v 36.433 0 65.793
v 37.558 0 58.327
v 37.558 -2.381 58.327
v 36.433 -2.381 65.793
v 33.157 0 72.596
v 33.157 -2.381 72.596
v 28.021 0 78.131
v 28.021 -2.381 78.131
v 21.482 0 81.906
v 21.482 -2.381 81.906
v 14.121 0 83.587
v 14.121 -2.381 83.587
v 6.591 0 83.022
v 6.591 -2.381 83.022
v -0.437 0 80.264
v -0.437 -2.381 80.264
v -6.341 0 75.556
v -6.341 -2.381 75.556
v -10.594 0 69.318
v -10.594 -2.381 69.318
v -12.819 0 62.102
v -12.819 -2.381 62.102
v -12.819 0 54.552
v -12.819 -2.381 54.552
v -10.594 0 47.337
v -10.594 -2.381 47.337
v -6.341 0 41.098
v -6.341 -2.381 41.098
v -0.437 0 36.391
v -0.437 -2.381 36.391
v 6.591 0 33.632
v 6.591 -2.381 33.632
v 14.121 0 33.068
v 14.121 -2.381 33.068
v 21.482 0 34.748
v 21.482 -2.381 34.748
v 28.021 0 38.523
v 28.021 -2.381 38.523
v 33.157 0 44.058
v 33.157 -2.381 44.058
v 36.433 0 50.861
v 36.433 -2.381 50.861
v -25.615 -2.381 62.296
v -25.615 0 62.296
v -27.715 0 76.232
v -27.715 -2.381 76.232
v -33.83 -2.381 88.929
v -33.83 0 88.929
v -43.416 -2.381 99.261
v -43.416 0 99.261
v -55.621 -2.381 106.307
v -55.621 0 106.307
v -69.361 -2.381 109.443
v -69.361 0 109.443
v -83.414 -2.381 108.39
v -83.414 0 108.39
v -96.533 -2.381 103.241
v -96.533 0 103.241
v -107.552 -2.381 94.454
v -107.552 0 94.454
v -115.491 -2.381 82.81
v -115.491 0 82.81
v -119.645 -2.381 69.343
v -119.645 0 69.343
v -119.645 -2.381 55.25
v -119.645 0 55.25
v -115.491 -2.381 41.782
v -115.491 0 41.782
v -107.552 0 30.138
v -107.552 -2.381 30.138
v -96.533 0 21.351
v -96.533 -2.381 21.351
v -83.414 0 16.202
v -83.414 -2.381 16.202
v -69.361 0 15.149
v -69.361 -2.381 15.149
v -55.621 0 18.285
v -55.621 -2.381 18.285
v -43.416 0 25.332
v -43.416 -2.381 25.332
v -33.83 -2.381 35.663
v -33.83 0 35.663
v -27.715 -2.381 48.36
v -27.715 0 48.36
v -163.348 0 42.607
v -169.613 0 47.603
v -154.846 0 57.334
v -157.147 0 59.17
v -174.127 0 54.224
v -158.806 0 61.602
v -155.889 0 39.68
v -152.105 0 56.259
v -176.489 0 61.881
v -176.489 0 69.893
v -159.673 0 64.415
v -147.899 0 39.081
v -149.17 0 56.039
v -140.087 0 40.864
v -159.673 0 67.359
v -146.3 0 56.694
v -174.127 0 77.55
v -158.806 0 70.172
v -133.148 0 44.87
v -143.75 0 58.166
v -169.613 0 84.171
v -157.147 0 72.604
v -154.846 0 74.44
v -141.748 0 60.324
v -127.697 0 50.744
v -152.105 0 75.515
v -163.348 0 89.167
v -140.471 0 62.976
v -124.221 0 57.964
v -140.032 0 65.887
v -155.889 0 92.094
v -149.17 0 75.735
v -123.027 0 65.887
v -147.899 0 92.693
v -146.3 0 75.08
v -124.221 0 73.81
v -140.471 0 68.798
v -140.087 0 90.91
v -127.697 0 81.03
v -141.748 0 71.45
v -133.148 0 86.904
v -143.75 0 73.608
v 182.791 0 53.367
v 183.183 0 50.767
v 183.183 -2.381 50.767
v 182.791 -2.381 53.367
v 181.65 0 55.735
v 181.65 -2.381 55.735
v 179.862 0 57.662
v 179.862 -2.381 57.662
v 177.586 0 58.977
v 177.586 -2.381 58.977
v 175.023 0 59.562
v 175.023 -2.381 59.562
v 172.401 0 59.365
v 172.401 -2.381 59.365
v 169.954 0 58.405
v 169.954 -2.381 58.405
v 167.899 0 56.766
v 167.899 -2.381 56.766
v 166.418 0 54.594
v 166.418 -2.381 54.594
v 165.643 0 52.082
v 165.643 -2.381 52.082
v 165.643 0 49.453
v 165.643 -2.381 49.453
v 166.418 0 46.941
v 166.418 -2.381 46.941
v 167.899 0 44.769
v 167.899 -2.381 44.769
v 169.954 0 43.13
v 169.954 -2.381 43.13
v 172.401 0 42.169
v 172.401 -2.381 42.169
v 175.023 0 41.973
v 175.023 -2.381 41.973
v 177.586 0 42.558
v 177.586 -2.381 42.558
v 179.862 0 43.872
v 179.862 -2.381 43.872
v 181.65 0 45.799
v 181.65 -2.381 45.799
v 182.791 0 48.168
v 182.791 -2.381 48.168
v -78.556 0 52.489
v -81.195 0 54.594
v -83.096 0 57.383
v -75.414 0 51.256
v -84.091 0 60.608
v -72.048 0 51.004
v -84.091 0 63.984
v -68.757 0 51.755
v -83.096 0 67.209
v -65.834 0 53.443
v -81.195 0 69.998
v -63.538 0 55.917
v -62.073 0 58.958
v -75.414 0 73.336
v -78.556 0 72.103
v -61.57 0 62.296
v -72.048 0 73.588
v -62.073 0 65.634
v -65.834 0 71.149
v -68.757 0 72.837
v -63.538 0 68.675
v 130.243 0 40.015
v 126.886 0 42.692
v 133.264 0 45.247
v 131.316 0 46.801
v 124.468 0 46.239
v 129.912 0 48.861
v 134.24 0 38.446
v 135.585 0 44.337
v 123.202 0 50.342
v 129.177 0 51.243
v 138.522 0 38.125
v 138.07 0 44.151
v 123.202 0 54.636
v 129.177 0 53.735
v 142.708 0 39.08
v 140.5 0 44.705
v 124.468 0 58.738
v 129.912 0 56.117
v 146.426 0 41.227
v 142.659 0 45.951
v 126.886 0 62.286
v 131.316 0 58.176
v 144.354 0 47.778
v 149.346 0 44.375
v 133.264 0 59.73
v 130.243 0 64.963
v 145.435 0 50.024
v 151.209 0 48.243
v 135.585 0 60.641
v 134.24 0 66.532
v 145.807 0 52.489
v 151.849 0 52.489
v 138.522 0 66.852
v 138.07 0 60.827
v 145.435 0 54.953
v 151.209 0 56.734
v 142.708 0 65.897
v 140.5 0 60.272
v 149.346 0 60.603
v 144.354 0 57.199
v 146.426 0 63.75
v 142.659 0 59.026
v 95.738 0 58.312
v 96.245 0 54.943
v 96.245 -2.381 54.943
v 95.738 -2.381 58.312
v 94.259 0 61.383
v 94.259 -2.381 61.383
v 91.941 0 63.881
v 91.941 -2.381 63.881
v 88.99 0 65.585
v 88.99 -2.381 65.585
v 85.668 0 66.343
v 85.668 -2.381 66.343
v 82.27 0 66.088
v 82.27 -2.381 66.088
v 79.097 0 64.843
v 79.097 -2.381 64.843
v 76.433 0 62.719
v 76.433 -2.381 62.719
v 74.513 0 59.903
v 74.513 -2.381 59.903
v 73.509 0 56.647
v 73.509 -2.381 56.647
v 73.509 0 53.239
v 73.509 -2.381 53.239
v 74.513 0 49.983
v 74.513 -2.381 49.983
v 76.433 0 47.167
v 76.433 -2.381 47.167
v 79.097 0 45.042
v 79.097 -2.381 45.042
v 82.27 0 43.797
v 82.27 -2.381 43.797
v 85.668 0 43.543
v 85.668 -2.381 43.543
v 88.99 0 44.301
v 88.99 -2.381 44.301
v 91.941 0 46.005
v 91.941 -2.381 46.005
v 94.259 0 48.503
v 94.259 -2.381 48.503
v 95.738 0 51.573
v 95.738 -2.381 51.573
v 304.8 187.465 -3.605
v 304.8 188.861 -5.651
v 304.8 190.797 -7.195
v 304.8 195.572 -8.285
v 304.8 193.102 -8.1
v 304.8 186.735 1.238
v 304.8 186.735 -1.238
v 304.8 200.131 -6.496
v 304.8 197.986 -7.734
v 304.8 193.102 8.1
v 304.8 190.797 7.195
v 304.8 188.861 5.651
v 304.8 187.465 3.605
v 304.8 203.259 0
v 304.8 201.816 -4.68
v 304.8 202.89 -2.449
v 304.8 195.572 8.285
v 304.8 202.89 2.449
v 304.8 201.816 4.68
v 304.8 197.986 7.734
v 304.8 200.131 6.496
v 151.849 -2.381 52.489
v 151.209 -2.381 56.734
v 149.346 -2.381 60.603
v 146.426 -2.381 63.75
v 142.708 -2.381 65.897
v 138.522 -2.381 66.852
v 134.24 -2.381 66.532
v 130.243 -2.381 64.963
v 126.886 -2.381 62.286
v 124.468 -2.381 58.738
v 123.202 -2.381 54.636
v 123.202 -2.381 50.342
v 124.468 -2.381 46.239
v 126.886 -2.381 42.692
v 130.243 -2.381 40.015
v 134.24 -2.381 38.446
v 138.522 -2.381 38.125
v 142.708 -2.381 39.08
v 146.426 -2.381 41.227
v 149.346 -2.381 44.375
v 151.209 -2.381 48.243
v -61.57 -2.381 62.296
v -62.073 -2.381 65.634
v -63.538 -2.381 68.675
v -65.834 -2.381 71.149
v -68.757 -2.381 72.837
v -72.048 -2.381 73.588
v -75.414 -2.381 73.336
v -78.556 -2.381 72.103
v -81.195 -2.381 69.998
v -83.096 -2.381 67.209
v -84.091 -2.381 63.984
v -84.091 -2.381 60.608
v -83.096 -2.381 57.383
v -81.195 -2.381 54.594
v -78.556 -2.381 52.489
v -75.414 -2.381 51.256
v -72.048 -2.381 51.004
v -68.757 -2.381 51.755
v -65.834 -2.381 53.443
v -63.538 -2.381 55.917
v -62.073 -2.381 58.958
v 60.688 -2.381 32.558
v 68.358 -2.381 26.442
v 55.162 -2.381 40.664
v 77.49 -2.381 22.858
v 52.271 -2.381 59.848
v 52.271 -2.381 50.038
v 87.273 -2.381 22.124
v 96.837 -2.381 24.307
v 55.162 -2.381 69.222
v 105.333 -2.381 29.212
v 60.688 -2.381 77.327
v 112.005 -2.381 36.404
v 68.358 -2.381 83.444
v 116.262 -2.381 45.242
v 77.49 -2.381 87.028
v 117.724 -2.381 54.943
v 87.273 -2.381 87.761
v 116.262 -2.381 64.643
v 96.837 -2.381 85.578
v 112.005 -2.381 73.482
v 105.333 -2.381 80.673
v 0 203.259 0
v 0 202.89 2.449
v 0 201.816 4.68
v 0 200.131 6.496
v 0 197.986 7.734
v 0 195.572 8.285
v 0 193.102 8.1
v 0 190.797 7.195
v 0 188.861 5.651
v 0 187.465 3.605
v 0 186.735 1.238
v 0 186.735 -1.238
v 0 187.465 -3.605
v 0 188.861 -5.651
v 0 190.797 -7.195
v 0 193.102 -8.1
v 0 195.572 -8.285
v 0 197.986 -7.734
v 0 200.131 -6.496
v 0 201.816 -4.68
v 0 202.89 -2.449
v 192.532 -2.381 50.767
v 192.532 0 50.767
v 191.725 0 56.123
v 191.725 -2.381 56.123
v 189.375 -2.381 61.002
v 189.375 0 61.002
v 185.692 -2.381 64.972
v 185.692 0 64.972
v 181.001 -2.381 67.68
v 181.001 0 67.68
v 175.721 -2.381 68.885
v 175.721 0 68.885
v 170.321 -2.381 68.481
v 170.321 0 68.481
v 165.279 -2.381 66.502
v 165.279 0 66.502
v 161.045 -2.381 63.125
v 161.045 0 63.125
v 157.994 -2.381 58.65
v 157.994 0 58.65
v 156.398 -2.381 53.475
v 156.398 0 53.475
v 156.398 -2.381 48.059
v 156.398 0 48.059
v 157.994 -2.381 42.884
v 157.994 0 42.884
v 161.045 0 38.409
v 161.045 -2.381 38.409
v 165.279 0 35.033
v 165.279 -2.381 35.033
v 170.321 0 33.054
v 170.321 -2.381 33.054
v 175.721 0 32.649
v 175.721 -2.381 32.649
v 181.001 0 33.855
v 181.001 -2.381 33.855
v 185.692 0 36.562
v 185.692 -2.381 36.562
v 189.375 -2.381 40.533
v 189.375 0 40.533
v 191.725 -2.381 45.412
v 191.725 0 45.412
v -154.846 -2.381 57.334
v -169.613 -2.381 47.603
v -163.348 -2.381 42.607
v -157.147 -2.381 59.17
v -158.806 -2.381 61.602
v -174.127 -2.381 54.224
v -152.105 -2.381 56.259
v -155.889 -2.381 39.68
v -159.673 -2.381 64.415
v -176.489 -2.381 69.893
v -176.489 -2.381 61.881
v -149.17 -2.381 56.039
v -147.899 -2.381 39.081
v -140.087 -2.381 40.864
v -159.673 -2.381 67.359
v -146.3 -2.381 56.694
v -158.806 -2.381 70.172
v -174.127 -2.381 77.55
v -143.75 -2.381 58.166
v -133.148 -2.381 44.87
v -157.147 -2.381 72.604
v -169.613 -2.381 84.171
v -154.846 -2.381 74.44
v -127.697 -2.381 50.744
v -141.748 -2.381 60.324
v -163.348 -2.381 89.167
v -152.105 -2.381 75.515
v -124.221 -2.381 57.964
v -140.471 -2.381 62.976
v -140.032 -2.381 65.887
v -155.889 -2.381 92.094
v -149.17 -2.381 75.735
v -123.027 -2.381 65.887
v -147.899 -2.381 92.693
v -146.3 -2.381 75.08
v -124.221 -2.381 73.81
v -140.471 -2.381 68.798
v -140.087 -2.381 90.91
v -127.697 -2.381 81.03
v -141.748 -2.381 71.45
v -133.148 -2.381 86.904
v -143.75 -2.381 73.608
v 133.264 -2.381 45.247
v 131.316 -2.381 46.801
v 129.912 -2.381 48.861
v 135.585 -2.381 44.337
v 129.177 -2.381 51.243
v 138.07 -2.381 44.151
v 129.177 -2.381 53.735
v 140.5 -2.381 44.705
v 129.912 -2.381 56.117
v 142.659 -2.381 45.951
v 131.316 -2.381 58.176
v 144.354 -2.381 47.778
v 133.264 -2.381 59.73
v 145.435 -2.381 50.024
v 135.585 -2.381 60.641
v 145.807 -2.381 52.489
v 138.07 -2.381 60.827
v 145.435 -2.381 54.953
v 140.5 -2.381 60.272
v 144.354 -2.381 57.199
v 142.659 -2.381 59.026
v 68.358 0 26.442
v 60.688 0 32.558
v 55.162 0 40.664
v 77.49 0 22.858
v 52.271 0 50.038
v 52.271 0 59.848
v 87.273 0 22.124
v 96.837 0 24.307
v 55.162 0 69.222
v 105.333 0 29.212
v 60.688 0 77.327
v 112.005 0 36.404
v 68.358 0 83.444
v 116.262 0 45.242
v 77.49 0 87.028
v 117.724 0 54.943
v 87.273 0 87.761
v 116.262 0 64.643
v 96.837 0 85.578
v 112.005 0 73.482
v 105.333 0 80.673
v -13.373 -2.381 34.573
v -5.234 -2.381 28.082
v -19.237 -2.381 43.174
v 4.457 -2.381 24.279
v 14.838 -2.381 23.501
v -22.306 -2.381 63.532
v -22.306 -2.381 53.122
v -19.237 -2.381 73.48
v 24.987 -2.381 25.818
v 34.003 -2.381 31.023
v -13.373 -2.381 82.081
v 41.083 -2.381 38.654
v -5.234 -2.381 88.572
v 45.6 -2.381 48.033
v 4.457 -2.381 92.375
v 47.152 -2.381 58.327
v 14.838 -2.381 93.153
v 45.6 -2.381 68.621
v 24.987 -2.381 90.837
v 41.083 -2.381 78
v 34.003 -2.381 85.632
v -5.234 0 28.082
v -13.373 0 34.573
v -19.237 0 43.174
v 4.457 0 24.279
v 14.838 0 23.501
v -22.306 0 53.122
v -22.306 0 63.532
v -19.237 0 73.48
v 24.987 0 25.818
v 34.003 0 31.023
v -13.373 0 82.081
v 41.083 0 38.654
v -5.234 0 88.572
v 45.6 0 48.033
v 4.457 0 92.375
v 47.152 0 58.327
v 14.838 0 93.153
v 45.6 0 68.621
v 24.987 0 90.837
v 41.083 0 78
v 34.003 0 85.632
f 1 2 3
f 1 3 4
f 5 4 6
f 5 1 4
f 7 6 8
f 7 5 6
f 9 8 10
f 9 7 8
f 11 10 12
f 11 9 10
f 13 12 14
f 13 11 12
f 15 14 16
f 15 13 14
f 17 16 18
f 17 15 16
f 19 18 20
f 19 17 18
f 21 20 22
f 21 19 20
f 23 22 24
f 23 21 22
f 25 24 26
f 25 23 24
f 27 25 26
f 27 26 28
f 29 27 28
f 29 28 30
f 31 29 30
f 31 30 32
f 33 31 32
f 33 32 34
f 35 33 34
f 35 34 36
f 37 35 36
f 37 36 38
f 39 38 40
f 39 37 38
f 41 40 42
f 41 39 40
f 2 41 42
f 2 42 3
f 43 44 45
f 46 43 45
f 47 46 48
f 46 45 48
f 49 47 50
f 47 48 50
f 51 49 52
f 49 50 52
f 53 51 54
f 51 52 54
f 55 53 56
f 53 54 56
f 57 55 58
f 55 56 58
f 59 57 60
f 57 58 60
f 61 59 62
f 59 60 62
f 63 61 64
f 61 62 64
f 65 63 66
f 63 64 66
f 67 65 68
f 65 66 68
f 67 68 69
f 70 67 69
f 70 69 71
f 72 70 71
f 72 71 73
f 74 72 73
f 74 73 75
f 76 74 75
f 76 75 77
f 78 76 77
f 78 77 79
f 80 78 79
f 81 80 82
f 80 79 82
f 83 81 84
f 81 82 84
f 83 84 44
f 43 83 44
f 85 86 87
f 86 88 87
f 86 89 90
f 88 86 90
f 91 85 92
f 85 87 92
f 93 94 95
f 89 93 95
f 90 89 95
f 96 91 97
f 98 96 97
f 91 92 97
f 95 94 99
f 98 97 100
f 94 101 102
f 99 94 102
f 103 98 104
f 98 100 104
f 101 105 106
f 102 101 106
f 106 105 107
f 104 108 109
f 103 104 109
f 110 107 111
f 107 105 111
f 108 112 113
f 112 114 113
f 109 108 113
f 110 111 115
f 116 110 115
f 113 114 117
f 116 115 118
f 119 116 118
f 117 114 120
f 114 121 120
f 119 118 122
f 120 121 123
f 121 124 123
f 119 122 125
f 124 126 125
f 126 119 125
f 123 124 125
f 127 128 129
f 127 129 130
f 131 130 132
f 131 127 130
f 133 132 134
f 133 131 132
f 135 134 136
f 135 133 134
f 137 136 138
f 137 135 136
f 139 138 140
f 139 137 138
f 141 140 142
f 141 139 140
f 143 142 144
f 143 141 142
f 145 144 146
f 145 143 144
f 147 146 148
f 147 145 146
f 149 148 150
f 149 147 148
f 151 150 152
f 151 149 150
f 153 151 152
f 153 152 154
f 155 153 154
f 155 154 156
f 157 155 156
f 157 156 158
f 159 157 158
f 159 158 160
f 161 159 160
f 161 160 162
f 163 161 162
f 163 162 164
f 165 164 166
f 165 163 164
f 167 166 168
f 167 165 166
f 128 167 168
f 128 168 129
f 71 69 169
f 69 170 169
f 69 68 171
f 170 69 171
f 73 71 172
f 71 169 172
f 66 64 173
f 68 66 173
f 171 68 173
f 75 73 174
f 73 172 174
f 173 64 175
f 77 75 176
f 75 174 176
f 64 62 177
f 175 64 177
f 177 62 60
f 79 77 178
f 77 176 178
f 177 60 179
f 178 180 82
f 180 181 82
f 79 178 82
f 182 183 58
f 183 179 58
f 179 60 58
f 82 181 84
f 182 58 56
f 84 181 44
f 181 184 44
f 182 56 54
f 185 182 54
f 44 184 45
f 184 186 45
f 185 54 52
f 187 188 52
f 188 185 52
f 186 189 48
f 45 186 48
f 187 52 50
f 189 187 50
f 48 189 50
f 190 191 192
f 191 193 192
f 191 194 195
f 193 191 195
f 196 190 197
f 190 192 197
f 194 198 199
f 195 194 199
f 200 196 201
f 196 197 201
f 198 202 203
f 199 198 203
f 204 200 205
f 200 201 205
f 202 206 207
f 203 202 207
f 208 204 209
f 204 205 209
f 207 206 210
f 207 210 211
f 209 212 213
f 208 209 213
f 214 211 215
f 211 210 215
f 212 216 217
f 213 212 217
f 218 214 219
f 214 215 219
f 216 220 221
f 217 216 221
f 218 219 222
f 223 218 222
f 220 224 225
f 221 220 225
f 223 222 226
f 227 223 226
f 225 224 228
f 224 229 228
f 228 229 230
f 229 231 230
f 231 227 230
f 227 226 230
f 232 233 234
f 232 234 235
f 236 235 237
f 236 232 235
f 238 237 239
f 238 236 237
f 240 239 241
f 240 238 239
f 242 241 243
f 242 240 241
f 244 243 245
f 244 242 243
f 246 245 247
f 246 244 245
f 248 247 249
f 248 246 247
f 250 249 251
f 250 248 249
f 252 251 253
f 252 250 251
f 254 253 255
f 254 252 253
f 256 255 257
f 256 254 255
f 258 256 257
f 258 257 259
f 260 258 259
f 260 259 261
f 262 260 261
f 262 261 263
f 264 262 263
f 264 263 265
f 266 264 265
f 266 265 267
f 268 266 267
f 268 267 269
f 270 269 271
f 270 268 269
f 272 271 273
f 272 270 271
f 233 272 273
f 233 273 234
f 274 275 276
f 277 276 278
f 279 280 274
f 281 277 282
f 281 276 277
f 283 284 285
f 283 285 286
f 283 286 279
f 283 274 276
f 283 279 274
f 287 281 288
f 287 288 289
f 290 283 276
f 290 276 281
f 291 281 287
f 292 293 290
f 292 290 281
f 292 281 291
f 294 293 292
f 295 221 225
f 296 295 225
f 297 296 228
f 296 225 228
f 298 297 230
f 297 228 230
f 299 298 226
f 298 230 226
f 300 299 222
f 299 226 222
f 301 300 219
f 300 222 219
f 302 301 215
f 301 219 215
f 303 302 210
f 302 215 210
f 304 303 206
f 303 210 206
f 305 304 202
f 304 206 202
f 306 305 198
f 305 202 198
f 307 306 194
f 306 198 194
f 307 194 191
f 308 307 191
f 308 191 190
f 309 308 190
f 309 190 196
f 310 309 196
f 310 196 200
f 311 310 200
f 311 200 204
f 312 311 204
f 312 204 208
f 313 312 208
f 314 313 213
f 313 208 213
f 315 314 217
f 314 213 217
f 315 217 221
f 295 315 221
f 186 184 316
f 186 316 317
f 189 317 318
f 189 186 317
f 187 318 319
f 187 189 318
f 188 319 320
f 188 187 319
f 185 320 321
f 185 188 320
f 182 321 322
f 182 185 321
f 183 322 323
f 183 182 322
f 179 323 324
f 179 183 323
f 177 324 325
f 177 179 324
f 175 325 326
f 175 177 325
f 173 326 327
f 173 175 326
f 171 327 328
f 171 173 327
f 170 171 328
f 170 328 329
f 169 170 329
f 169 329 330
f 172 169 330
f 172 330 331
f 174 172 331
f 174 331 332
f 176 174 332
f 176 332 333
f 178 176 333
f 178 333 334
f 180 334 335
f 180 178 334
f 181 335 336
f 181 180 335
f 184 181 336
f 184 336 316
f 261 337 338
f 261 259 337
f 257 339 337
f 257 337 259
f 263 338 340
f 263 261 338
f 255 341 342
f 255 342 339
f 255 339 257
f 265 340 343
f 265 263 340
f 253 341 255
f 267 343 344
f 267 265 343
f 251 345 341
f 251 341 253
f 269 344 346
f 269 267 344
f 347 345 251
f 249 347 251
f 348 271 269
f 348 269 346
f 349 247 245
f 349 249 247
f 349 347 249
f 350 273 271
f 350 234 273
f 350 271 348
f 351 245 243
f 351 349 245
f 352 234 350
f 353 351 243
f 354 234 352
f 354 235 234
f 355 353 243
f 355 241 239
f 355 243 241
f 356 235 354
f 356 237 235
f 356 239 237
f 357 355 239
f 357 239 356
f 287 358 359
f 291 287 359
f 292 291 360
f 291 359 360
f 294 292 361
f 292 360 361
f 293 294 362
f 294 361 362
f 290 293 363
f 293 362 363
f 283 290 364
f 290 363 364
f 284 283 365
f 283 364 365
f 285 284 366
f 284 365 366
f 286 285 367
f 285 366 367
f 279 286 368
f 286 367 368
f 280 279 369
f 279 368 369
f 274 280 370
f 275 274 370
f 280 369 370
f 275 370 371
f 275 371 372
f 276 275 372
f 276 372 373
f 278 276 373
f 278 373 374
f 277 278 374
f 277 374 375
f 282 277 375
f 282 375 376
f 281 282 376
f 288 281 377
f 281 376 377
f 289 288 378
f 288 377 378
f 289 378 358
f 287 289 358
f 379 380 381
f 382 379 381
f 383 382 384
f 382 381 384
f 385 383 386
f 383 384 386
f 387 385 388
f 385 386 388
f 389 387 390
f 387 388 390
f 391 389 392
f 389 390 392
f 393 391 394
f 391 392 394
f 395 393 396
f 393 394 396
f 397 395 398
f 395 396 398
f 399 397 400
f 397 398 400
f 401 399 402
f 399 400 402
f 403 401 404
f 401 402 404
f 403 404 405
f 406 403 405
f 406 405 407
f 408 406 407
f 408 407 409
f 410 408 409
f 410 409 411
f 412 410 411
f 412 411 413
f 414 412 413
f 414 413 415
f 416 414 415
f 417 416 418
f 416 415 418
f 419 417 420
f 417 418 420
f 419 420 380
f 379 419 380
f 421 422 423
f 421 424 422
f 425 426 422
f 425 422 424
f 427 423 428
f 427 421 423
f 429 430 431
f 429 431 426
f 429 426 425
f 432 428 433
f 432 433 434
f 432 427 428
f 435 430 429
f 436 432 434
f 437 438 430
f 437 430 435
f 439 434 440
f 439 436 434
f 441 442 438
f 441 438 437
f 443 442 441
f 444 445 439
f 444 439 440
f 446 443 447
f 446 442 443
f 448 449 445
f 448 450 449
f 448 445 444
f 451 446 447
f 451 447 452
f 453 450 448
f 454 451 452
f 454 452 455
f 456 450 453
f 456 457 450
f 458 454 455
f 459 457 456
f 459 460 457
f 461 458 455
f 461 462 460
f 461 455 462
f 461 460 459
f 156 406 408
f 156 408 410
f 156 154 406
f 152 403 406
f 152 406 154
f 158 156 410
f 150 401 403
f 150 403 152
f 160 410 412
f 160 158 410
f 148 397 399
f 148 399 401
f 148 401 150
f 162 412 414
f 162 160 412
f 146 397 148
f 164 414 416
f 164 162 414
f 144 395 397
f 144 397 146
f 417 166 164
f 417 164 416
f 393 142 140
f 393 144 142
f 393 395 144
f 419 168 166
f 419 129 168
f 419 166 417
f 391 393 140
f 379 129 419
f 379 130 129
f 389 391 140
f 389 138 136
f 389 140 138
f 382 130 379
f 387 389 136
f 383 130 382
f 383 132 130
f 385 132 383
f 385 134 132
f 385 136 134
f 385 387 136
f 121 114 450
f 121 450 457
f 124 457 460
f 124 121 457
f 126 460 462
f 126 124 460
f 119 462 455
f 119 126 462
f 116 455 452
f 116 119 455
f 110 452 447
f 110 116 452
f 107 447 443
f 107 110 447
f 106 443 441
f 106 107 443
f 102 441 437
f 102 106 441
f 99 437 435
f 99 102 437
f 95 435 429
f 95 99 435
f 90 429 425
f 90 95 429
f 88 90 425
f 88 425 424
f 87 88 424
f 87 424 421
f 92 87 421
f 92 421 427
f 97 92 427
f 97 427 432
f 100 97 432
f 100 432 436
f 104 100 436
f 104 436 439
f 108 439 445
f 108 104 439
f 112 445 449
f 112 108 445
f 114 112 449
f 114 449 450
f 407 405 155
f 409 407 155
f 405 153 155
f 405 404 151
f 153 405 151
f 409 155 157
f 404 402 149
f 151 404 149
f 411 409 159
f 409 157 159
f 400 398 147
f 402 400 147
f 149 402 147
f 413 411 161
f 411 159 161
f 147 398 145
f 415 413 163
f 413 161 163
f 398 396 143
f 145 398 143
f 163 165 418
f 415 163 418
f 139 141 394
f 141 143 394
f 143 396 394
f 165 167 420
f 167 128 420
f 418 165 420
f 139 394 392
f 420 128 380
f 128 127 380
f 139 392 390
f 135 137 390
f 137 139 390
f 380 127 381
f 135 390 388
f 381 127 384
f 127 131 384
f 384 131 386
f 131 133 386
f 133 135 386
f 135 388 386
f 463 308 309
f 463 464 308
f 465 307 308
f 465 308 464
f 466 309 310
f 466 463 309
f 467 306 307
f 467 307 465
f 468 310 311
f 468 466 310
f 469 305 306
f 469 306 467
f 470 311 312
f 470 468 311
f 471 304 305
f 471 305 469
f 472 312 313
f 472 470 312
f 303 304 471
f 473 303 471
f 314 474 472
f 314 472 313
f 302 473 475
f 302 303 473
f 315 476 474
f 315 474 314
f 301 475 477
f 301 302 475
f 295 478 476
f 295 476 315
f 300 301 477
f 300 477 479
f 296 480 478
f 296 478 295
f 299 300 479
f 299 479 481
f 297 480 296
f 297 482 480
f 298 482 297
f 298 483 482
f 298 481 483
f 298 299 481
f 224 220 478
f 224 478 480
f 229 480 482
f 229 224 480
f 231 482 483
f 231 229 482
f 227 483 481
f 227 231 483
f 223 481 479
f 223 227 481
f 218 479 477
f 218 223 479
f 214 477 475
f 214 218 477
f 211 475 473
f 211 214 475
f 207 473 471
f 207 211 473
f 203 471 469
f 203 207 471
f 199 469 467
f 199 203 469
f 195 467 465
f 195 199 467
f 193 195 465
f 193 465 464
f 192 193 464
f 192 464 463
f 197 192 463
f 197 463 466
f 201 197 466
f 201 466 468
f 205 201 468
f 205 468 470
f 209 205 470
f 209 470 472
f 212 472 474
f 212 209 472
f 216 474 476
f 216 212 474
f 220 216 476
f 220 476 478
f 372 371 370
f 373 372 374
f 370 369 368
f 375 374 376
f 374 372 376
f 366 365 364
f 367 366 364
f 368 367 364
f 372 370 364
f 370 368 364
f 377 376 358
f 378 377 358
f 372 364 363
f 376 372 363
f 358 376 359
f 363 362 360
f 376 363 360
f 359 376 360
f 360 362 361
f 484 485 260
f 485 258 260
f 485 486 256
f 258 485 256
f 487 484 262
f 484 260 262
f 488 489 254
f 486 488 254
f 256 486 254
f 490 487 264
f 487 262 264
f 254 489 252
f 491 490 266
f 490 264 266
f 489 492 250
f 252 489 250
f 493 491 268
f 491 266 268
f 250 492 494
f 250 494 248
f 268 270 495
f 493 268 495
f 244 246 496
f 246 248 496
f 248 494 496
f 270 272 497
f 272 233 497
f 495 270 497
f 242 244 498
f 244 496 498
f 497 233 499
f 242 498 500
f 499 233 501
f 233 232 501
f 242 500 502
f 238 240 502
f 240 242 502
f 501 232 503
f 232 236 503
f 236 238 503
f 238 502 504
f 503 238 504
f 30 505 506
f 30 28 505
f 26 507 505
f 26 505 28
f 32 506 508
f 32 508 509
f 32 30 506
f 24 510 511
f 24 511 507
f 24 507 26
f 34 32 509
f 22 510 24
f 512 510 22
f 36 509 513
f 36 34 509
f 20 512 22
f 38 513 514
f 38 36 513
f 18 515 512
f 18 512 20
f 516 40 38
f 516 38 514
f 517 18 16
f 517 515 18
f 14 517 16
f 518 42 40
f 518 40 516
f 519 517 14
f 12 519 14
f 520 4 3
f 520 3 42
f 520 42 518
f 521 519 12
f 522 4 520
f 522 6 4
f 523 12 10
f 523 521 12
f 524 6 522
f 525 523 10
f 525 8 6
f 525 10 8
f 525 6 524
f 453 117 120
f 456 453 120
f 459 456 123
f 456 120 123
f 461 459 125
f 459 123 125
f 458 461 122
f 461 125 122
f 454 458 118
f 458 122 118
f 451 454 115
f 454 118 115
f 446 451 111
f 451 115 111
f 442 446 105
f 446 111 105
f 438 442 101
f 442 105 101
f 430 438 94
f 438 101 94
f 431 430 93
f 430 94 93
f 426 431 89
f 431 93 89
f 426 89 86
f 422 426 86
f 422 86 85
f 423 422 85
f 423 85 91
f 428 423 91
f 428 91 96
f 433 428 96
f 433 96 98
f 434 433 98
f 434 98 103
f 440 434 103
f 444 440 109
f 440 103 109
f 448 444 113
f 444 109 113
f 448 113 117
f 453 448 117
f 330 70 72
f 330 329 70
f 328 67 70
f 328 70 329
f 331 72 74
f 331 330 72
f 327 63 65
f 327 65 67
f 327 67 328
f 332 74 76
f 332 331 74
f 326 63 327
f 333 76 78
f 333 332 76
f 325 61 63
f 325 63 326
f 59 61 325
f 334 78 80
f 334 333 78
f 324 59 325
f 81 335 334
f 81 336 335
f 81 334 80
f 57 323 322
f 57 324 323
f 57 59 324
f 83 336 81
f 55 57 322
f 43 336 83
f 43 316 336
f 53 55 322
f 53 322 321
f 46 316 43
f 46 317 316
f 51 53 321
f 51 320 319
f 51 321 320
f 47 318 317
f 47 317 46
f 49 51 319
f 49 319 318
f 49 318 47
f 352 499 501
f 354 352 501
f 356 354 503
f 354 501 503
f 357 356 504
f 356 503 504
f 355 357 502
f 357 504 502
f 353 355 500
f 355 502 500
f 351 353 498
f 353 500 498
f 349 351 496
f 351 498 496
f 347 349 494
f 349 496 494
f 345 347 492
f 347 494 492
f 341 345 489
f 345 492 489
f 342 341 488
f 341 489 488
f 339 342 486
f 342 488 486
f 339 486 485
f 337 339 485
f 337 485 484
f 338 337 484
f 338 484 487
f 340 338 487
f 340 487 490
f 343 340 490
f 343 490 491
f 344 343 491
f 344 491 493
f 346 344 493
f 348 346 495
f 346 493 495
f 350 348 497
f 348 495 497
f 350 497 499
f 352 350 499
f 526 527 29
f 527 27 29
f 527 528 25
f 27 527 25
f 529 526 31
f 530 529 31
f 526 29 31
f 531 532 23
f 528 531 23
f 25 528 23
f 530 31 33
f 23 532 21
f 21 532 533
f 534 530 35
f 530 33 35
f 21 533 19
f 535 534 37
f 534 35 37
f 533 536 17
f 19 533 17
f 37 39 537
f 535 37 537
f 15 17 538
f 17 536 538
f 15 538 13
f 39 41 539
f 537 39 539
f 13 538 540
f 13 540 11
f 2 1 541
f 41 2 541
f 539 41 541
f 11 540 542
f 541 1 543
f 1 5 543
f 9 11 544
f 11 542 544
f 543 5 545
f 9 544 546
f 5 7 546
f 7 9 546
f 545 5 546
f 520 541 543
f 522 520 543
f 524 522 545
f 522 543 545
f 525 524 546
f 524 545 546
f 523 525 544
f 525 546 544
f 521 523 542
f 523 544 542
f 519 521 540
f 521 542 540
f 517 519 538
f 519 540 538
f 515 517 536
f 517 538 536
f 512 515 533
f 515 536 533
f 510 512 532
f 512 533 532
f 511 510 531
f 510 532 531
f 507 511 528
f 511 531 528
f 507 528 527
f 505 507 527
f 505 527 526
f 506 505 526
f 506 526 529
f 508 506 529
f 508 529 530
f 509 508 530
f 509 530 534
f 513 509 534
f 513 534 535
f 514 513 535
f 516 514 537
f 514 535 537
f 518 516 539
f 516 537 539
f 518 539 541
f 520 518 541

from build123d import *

# Parameters (mm, degrees)
F0_R     = 18.1687180168
F0_R_2   = 8.8190592327
F1_DEPTH = 2.38125
F0_R_3   = 14.4040085197
F0_R_4   = 8.3616203188
F0_R_5   = 32.910330078
F0_R_6   = 11.4321100003
F0_R_7   = 34.9237905831
F0_R_8   = 25.330278317
F0_R_9   = 47.2792187039
F0_R_10  = 11.3237611098
F0_R_11  = 26.8812365552
F0_R_12  = 9.8757429668
F2_R     = 8.3083314945
F3_DEPTH = 304.8


# Not quite as in the source:
# - a length typed as a fraction of an inch, garbled in the dataset ("3 / 203.2 mm" for 3/8 in), is restored


with BuildPart() as f1:
    # F0 (on Front) → F1 (new body)
    with BuildSketch(Plane.XZ):
        with Locations((174.3635833263, 50.7673621178)):
            Circle(F0_R)
        with Locations((174.3635833263, 50.7673621178)):
            Circle(F0_R_2, mode=Mode.SUBTRACT)
    extrude(amount=F1_DEPTH)


with BuildPart() as f1b:
    # F0 (on Front) → F1, piece 2 (new body)
    with BuildSketch(Plane.XZ):
        with Locations((137.4451422389, 52.4887427962)):
            Circle(F0_R_3)
        with Locations((137.4451422389, 52.4887427962)):
            Circle(F0_R_4, mode=Mode.SUBTRACT)
    extrude(amount=F1_DEPTH)


with BuildPart() as f1c:
    # F0 (on Front) → F1, piece 3 (new body)
    with BuildSketch(Plane.XZ):
        with Locations((84.8133870552, 54.9427815848)):
            Circle(F0_R_5)
        with Locations((84.8133870552, 54.9427815848)):
            Circle(F0_R_6, mode=Mode.SUBTRACT)
    extrude(amount=F1_DEPTH)


with BuildPart() as f1d:
    # F0 (on Front) → F1, piece 4 (new body)
    with BuildSketch(Plane.XZ):
        with Locations((12.2279077768, 58.3271943033)):
            Circle(F0_R_7)
        with Locations((12.2279077768, 58.3271943033)):
            Circle(F0_R_8, mode=Mode.SUBTRACT)
    extrude(amount=F1_DEPTH)


with BuildPart() as f1e:
    # F0 (on Front) → F1, piece 5 (new body)
    with BuildSketch(Plane.XZ):
        with Locations((-72.893794205, 62.2961282233)):
            Circle(F0_R_9)
        with Locations((-72.893794205, 62.2961282233)):
            Circle(F0_R_10, mode=Mode.SUBTRACT)
    extrude(amount=F1_DEPTH)


with BuildPart() as f1f:
    # F0 (on Front) → F1, piece 6 (new body)
    with BuildSketch(Plane.XZ):
        with Locations((-149.9077677727, 65.8870264888)):
            Circle(F0_R_11)
        with Locations((-149.9077677727, 65.8870264888)):
            Circle(F0_R_12, mode=Mode.SUBTRACT)
    extrude(amount=F1_DEPTH)


with BuildPart() as f3:
    # F2 (on Right) → F3 (new body)
    with BuildSketch(Plane.YZ):
        with Locations((194.9509978294, 0)):
            Circle(F2_R)
    extrude(amount=F3_DEPTH)


solid = Compound([f1.part, f1b.part, f1c.part, f1d.part, f1e.part, f1f.part, f3.part])
